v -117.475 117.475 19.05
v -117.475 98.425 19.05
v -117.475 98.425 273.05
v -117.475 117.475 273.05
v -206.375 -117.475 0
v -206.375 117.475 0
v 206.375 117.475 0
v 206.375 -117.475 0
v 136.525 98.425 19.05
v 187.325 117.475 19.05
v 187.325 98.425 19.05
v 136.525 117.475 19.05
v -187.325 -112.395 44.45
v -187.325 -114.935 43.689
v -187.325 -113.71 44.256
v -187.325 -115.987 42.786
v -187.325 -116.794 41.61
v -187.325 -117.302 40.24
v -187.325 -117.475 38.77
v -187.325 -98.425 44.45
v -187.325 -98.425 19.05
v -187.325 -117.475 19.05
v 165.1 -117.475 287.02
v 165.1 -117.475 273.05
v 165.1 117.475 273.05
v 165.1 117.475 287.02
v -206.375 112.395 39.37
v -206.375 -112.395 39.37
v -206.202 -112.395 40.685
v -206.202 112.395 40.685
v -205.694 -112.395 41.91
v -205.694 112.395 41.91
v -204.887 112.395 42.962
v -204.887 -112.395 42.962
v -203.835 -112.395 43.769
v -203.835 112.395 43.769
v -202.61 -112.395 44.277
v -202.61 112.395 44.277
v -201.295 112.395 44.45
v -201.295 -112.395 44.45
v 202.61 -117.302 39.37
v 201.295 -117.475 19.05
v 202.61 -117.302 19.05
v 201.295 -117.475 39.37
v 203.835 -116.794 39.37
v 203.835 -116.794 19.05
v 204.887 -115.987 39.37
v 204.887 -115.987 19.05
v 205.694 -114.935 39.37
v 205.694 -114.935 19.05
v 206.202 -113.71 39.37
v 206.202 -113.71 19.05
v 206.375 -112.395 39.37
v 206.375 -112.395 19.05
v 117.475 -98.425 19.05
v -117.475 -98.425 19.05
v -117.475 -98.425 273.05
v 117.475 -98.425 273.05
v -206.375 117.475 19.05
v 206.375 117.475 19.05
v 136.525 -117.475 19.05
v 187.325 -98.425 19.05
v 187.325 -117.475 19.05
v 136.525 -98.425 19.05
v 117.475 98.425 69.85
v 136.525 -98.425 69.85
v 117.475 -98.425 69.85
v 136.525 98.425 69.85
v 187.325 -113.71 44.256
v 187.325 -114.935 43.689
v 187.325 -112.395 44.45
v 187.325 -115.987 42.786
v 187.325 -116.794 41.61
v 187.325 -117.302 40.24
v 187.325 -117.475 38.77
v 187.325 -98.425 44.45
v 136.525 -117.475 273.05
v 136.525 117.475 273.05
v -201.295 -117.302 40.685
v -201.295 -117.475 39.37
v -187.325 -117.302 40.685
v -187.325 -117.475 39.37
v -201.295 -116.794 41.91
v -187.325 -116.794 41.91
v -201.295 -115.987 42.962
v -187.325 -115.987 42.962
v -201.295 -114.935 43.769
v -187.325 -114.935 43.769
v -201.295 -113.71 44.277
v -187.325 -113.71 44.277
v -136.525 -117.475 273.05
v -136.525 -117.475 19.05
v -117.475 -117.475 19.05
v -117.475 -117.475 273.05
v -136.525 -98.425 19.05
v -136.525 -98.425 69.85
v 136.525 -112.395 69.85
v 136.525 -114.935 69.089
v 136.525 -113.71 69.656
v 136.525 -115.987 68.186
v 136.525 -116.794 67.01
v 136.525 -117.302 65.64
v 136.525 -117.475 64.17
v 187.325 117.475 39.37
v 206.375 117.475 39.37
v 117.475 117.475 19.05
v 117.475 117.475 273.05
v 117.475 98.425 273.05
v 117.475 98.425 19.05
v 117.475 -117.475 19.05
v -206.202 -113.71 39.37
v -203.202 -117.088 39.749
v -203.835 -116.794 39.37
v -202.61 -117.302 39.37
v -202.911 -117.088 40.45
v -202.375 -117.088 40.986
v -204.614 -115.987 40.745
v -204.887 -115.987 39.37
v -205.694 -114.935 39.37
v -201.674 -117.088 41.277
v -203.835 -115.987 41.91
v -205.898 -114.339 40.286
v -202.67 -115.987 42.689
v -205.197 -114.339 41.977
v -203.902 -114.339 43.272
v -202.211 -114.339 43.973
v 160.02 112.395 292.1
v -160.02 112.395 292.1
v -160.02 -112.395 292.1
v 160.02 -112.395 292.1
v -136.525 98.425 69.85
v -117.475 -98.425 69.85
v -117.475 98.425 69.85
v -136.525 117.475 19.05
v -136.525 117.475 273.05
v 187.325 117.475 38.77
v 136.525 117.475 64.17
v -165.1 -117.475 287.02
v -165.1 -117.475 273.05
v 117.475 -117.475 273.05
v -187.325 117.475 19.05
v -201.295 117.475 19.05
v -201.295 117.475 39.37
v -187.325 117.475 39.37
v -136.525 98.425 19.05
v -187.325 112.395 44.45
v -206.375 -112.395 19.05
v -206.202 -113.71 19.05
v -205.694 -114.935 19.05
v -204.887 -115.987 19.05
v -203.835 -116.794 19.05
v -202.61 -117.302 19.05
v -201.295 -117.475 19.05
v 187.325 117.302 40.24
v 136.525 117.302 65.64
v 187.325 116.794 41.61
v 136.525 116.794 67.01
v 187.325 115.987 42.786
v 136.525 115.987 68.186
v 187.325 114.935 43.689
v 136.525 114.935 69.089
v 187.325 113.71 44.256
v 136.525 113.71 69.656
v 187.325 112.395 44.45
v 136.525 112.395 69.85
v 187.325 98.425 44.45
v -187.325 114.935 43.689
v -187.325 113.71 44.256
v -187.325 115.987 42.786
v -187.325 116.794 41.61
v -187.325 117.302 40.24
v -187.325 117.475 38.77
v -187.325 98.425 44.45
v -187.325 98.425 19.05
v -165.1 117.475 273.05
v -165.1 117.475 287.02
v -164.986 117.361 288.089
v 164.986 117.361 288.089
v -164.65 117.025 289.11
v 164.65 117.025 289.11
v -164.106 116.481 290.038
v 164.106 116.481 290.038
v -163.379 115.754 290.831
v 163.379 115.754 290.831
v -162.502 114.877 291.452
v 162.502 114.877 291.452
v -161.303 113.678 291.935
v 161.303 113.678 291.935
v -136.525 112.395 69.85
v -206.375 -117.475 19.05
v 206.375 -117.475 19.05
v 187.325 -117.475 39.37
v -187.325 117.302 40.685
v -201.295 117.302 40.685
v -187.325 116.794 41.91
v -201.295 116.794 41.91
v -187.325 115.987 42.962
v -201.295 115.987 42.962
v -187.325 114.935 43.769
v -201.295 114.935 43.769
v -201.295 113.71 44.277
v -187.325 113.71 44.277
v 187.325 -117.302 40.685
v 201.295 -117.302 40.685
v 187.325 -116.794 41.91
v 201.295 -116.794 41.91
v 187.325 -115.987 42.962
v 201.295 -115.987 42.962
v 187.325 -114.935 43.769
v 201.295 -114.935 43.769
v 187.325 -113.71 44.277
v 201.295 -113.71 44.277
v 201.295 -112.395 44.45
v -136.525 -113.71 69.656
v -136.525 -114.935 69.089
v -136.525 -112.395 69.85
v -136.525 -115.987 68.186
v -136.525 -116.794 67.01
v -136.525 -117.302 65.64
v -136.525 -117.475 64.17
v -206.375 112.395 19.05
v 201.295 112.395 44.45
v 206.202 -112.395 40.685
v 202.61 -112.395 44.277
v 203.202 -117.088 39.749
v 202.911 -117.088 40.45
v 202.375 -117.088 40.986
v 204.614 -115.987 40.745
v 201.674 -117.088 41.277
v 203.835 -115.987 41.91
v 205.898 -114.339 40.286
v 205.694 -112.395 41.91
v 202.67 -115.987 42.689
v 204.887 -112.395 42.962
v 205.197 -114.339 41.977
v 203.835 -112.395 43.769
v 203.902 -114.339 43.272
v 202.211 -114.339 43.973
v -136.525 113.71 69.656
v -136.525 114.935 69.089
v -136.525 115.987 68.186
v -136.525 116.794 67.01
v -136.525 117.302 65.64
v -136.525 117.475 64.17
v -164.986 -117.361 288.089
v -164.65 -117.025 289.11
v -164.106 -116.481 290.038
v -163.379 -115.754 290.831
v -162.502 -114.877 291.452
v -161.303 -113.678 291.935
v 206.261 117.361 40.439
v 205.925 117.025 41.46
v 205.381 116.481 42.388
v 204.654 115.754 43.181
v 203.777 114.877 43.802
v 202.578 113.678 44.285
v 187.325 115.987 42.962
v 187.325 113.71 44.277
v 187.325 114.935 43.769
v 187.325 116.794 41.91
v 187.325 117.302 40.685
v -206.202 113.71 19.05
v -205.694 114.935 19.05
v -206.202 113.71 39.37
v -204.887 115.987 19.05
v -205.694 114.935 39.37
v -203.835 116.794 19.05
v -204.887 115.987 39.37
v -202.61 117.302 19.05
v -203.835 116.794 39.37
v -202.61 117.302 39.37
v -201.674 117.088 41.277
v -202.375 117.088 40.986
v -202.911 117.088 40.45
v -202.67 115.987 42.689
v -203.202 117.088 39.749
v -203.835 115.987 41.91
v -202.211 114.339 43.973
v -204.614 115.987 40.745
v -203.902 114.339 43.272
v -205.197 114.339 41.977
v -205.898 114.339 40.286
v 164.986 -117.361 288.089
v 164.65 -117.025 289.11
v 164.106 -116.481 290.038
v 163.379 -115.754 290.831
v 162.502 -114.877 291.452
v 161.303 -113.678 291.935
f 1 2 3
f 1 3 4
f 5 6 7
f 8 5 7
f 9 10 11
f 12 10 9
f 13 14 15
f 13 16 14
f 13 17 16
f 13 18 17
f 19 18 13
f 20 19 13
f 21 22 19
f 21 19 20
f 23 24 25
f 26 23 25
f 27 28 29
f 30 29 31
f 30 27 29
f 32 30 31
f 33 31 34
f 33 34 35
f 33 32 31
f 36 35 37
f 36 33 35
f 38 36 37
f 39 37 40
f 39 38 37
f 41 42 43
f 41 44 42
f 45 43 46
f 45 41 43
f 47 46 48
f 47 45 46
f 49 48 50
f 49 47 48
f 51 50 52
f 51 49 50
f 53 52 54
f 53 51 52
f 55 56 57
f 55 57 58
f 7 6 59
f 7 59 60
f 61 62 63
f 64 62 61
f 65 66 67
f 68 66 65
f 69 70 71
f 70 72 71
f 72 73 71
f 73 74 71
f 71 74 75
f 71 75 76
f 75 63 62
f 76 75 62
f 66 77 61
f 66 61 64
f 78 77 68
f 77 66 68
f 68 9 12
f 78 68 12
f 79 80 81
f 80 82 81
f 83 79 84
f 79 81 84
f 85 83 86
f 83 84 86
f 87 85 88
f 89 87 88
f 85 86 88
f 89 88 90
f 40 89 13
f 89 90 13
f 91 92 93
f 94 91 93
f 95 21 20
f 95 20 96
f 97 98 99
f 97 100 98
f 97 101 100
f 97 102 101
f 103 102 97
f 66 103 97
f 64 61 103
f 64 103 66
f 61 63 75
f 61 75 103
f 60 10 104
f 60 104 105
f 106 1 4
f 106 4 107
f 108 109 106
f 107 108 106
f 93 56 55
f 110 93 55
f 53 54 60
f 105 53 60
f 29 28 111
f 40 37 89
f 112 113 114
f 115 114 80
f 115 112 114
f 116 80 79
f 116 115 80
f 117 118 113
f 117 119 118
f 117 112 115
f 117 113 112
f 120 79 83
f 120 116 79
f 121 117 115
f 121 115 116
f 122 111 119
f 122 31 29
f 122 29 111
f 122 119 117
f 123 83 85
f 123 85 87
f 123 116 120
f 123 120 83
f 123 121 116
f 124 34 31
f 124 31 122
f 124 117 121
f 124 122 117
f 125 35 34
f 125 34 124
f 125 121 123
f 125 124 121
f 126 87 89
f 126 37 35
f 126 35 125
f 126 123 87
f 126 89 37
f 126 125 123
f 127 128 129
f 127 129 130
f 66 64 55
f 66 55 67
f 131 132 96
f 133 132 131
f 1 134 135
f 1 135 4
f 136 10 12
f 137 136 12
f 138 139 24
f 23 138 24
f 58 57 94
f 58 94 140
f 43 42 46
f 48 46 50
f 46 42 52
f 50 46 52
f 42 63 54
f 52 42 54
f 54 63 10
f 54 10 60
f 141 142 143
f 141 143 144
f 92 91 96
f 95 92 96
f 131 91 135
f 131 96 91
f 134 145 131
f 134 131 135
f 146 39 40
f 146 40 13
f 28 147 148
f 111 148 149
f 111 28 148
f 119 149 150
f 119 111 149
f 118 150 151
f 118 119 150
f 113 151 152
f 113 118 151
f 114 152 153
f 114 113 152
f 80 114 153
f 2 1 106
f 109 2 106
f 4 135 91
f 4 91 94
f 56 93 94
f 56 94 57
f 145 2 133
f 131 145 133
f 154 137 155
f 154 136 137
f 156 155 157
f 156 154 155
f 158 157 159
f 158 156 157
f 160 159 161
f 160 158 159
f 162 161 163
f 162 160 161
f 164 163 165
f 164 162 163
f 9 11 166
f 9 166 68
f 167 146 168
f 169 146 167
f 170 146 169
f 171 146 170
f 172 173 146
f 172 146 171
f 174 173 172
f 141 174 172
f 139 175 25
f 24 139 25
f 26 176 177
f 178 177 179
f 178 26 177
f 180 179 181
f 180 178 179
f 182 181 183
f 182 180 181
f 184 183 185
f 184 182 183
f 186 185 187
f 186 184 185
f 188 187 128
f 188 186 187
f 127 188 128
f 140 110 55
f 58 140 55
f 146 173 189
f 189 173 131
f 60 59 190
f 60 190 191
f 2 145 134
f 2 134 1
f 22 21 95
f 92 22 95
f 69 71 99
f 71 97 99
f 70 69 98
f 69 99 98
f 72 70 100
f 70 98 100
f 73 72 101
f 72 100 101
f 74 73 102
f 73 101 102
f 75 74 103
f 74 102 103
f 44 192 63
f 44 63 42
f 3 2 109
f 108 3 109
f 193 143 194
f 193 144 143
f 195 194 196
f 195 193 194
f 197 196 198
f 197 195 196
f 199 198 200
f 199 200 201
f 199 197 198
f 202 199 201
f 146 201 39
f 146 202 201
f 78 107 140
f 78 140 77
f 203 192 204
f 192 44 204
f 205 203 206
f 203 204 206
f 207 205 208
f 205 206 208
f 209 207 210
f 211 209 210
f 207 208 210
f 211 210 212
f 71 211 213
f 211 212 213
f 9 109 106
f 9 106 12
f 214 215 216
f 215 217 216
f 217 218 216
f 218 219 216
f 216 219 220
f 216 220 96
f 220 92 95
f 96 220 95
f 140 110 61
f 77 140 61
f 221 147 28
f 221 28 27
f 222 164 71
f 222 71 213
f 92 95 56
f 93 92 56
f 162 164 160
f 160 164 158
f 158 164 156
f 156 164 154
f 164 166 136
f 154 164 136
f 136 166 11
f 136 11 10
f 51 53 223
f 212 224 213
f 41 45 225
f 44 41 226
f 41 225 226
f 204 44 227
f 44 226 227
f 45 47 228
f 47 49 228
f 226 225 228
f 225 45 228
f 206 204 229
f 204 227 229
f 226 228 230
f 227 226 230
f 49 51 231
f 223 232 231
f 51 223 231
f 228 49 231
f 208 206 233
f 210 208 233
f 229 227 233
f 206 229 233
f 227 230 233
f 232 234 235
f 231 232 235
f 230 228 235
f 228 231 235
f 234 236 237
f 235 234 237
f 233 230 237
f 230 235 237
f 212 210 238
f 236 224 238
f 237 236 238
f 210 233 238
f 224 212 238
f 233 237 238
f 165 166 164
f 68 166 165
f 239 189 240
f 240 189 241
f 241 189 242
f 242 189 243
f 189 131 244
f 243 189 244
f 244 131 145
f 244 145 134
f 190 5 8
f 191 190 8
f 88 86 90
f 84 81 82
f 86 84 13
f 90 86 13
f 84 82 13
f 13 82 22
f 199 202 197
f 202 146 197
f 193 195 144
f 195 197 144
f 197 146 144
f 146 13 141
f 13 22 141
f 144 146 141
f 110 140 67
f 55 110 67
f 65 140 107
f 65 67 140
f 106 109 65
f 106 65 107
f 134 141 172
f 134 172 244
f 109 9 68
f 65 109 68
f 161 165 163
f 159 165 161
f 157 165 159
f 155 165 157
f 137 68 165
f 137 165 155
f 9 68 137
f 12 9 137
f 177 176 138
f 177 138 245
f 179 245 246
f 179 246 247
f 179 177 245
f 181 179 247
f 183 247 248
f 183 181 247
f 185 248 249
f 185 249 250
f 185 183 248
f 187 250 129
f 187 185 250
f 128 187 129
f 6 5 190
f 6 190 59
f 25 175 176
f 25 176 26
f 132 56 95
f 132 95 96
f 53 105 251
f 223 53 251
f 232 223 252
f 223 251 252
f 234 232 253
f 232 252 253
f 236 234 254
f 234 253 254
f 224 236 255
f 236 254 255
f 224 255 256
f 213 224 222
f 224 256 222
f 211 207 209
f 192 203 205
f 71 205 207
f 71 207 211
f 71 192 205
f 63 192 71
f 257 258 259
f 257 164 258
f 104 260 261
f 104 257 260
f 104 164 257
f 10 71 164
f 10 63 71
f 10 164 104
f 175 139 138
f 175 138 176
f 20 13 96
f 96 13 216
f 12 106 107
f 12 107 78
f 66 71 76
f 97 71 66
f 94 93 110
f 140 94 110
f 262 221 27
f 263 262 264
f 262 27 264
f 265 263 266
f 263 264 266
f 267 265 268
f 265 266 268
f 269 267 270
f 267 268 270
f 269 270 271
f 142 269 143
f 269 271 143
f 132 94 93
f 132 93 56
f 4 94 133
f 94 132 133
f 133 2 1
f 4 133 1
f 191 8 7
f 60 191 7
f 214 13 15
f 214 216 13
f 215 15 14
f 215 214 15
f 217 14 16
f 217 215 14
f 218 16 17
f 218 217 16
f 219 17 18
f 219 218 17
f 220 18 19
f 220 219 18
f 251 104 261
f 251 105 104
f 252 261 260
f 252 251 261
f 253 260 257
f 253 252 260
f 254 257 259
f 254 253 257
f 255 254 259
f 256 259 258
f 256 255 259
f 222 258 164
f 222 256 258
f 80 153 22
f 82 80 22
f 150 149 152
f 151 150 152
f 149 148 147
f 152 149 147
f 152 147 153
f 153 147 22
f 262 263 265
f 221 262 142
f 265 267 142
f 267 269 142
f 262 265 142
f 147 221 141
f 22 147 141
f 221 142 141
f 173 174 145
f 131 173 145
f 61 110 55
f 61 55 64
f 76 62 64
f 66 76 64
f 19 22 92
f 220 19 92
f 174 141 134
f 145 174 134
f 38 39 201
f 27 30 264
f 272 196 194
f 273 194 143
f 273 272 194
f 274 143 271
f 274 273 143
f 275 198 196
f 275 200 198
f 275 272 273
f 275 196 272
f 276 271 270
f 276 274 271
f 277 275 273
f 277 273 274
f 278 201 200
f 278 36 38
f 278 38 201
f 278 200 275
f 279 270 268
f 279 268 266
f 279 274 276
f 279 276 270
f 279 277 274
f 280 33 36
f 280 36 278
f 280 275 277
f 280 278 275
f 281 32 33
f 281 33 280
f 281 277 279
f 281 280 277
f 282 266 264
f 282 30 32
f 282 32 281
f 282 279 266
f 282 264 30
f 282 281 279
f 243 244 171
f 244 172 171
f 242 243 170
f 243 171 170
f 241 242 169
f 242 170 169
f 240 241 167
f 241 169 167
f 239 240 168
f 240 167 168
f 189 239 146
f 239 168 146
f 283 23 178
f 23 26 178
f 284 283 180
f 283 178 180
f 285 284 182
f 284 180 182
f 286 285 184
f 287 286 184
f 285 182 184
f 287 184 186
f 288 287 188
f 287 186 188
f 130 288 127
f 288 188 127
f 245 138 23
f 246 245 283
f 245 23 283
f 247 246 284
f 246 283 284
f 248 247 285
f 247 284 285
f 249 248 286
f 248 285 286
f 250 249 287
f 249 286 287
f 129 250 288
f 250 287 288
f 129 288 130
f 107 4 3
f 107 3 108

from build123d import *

# Parameters (mm, degrees)
F0_W      = 412.75
F0_H      = 234.95
F1_DEPTH  = 19.05
F2_W      = 19.05
F2_H      = 234.95
F3_DEPTH  = 25.4
F4_W      = 50.8
F4_H      = 19.05
F5_DEPTH  = 50.8
F6_W      = 19.05
F6_H      = 234.95
F7_DEPTH  = 254
F8_W      = 196.85
F8_H      = 50.8
F9_DEPTH  = 273.05
F10_W     = 234.95
F10_H     = 19.05
F11_DEPTH = 254
F12_W     = 330.2
F12_H     = 234.95
F13_DEPTH = 19.05
F15_DEPTH = 234.951
F16_R     = 5.08
F16_2_R   = 5.08
F16_3_R   = 5.08


with BuildPart() as f1:
    # F0 (on Top) → F1 (new body)
    with BuildSketch(Plane.XY):
        Rectangle(F0_W, F0_H)
    extrude(amount=F1_DEPTH)


with BuildPart() as f3:
    # F2 (on face) → F3 (new body)
    with BuildSketch(Plane.XY.offset(19.05)):
        with Locations((-196.85, 0)):
            Rectangle(F2_W, F2_H)
        with Locations((196.85, 0)):
            Rectangle(F2_W, F2_H)
    extrude(amount=F3_DEPTH)

    # F16
    f16_edges = [f3.edges().sort_by_distance(p)[0] for p in [
        (-206.375, 0, 44.45),
        (206.375, 0, 44.45),
        (196.85, 117.475, 44.45),
        (-196.85, 117.475, 44.45),
        (-206.375, -117.475, 31.75),
        (-206.375, 117.475, 31.75),
        (206.375, -117.475, 31.75),
        (196.85, -117.475, 44.45),
        (-196.85, -117.475, 44.45),
    ]]
    fillet(f16_edges, radius=F16_R)


with BuildPart() as f5:
    # F4 (on face) → F5 (new body)
    with BuildSketch(Plane.XY.offset(19.05)):
        with Locations((-161.925, 107.95)):
            Rectangle(F4_W, F4_H)
        with Locations((-161.925, -107.95)):
            Rectangle(F4_W, F4_H)
    extrude(amount=F5_DEPTH)

    # F14 (on face) → F15 (cut, through all)
    with BuildSketch(Plane.XZ.offset(117.475)):
        Polygon((-187.325, 44.45), (-136.525, 69.85), (-187.325, 69.85), align=None)
    extrude(amount=-F15_DEPTH, mode=Mode.SUBTRACT)

    # F16#2
    f16_2_edges = [f5.edges().sort_by_distance(p)[0] for p in [
        (-161.925, 117.475, 57.15),
        (-161.925, -117.475, 57.15),
    ]]
    fillet(f16_2_edges, radius=F16_2_R)


with BuildPart() as f7:
    # F6 (on face) → F7 (new body)
    with BuildSketch(Plane.XY.offset(19.05)):
        with Locations((-127, 0)):
            Rectangle(F6_W, F6_H)
        with Locations((127, 0)):
            Rectangle(F6_W, F6_H)
    extrude(amount=F7_DEPTH)

    # F8 (on face) → F9 (cut, through all)
    with BuildSketch(Plane.YZ.offset(136.525)):
        with Locations((0, 44.45)):
            Rectangle(F8_W, F8_H)
    extrude(amount=-F9_DEPTH, mode=Mode.SUBTRACT)


with BuildPart() as f11:
    # F10 (on face) → F11 (new body)
    with BuildSketch(Plane.XY.offset(19.05)):
        with Locations((0, 107.95)):
            Rectangle(F10_W, F10_H)
        with Locations((0, -107.95)):
            Rectangle(F10_W, F10_H)
    extrude(amount=F11_DEPTH)


with BuildPart() as f13:
    # F12 (on face) → F13 (new body)
    with BuildSketch(Plane.XY.offset(273.05)):
        Rectangle(F12_W, F12_H)
    extrude(amount=F13_DEPTH)

    # F16#3
    f16_3_edges = [f13.edges().sort_by_distance(p)[0] for p in [
        (0, 117.475, 292.1),
        (-165.1, 0, 292.1),
        (0, -117.475, 292.1),
        (165.1, 0, 292.1),
    ]]
    fillet(f16_3_edges, radius=F16_3_R)


with BuildPart() as f17_1:
    # F17: instance of F5
    add(f5.part.mirror(Plane.YZ))


solid = Compound([f1.part, f3.part, f5.part, f7.part, f11.part, f13.part, f17_1.part])
